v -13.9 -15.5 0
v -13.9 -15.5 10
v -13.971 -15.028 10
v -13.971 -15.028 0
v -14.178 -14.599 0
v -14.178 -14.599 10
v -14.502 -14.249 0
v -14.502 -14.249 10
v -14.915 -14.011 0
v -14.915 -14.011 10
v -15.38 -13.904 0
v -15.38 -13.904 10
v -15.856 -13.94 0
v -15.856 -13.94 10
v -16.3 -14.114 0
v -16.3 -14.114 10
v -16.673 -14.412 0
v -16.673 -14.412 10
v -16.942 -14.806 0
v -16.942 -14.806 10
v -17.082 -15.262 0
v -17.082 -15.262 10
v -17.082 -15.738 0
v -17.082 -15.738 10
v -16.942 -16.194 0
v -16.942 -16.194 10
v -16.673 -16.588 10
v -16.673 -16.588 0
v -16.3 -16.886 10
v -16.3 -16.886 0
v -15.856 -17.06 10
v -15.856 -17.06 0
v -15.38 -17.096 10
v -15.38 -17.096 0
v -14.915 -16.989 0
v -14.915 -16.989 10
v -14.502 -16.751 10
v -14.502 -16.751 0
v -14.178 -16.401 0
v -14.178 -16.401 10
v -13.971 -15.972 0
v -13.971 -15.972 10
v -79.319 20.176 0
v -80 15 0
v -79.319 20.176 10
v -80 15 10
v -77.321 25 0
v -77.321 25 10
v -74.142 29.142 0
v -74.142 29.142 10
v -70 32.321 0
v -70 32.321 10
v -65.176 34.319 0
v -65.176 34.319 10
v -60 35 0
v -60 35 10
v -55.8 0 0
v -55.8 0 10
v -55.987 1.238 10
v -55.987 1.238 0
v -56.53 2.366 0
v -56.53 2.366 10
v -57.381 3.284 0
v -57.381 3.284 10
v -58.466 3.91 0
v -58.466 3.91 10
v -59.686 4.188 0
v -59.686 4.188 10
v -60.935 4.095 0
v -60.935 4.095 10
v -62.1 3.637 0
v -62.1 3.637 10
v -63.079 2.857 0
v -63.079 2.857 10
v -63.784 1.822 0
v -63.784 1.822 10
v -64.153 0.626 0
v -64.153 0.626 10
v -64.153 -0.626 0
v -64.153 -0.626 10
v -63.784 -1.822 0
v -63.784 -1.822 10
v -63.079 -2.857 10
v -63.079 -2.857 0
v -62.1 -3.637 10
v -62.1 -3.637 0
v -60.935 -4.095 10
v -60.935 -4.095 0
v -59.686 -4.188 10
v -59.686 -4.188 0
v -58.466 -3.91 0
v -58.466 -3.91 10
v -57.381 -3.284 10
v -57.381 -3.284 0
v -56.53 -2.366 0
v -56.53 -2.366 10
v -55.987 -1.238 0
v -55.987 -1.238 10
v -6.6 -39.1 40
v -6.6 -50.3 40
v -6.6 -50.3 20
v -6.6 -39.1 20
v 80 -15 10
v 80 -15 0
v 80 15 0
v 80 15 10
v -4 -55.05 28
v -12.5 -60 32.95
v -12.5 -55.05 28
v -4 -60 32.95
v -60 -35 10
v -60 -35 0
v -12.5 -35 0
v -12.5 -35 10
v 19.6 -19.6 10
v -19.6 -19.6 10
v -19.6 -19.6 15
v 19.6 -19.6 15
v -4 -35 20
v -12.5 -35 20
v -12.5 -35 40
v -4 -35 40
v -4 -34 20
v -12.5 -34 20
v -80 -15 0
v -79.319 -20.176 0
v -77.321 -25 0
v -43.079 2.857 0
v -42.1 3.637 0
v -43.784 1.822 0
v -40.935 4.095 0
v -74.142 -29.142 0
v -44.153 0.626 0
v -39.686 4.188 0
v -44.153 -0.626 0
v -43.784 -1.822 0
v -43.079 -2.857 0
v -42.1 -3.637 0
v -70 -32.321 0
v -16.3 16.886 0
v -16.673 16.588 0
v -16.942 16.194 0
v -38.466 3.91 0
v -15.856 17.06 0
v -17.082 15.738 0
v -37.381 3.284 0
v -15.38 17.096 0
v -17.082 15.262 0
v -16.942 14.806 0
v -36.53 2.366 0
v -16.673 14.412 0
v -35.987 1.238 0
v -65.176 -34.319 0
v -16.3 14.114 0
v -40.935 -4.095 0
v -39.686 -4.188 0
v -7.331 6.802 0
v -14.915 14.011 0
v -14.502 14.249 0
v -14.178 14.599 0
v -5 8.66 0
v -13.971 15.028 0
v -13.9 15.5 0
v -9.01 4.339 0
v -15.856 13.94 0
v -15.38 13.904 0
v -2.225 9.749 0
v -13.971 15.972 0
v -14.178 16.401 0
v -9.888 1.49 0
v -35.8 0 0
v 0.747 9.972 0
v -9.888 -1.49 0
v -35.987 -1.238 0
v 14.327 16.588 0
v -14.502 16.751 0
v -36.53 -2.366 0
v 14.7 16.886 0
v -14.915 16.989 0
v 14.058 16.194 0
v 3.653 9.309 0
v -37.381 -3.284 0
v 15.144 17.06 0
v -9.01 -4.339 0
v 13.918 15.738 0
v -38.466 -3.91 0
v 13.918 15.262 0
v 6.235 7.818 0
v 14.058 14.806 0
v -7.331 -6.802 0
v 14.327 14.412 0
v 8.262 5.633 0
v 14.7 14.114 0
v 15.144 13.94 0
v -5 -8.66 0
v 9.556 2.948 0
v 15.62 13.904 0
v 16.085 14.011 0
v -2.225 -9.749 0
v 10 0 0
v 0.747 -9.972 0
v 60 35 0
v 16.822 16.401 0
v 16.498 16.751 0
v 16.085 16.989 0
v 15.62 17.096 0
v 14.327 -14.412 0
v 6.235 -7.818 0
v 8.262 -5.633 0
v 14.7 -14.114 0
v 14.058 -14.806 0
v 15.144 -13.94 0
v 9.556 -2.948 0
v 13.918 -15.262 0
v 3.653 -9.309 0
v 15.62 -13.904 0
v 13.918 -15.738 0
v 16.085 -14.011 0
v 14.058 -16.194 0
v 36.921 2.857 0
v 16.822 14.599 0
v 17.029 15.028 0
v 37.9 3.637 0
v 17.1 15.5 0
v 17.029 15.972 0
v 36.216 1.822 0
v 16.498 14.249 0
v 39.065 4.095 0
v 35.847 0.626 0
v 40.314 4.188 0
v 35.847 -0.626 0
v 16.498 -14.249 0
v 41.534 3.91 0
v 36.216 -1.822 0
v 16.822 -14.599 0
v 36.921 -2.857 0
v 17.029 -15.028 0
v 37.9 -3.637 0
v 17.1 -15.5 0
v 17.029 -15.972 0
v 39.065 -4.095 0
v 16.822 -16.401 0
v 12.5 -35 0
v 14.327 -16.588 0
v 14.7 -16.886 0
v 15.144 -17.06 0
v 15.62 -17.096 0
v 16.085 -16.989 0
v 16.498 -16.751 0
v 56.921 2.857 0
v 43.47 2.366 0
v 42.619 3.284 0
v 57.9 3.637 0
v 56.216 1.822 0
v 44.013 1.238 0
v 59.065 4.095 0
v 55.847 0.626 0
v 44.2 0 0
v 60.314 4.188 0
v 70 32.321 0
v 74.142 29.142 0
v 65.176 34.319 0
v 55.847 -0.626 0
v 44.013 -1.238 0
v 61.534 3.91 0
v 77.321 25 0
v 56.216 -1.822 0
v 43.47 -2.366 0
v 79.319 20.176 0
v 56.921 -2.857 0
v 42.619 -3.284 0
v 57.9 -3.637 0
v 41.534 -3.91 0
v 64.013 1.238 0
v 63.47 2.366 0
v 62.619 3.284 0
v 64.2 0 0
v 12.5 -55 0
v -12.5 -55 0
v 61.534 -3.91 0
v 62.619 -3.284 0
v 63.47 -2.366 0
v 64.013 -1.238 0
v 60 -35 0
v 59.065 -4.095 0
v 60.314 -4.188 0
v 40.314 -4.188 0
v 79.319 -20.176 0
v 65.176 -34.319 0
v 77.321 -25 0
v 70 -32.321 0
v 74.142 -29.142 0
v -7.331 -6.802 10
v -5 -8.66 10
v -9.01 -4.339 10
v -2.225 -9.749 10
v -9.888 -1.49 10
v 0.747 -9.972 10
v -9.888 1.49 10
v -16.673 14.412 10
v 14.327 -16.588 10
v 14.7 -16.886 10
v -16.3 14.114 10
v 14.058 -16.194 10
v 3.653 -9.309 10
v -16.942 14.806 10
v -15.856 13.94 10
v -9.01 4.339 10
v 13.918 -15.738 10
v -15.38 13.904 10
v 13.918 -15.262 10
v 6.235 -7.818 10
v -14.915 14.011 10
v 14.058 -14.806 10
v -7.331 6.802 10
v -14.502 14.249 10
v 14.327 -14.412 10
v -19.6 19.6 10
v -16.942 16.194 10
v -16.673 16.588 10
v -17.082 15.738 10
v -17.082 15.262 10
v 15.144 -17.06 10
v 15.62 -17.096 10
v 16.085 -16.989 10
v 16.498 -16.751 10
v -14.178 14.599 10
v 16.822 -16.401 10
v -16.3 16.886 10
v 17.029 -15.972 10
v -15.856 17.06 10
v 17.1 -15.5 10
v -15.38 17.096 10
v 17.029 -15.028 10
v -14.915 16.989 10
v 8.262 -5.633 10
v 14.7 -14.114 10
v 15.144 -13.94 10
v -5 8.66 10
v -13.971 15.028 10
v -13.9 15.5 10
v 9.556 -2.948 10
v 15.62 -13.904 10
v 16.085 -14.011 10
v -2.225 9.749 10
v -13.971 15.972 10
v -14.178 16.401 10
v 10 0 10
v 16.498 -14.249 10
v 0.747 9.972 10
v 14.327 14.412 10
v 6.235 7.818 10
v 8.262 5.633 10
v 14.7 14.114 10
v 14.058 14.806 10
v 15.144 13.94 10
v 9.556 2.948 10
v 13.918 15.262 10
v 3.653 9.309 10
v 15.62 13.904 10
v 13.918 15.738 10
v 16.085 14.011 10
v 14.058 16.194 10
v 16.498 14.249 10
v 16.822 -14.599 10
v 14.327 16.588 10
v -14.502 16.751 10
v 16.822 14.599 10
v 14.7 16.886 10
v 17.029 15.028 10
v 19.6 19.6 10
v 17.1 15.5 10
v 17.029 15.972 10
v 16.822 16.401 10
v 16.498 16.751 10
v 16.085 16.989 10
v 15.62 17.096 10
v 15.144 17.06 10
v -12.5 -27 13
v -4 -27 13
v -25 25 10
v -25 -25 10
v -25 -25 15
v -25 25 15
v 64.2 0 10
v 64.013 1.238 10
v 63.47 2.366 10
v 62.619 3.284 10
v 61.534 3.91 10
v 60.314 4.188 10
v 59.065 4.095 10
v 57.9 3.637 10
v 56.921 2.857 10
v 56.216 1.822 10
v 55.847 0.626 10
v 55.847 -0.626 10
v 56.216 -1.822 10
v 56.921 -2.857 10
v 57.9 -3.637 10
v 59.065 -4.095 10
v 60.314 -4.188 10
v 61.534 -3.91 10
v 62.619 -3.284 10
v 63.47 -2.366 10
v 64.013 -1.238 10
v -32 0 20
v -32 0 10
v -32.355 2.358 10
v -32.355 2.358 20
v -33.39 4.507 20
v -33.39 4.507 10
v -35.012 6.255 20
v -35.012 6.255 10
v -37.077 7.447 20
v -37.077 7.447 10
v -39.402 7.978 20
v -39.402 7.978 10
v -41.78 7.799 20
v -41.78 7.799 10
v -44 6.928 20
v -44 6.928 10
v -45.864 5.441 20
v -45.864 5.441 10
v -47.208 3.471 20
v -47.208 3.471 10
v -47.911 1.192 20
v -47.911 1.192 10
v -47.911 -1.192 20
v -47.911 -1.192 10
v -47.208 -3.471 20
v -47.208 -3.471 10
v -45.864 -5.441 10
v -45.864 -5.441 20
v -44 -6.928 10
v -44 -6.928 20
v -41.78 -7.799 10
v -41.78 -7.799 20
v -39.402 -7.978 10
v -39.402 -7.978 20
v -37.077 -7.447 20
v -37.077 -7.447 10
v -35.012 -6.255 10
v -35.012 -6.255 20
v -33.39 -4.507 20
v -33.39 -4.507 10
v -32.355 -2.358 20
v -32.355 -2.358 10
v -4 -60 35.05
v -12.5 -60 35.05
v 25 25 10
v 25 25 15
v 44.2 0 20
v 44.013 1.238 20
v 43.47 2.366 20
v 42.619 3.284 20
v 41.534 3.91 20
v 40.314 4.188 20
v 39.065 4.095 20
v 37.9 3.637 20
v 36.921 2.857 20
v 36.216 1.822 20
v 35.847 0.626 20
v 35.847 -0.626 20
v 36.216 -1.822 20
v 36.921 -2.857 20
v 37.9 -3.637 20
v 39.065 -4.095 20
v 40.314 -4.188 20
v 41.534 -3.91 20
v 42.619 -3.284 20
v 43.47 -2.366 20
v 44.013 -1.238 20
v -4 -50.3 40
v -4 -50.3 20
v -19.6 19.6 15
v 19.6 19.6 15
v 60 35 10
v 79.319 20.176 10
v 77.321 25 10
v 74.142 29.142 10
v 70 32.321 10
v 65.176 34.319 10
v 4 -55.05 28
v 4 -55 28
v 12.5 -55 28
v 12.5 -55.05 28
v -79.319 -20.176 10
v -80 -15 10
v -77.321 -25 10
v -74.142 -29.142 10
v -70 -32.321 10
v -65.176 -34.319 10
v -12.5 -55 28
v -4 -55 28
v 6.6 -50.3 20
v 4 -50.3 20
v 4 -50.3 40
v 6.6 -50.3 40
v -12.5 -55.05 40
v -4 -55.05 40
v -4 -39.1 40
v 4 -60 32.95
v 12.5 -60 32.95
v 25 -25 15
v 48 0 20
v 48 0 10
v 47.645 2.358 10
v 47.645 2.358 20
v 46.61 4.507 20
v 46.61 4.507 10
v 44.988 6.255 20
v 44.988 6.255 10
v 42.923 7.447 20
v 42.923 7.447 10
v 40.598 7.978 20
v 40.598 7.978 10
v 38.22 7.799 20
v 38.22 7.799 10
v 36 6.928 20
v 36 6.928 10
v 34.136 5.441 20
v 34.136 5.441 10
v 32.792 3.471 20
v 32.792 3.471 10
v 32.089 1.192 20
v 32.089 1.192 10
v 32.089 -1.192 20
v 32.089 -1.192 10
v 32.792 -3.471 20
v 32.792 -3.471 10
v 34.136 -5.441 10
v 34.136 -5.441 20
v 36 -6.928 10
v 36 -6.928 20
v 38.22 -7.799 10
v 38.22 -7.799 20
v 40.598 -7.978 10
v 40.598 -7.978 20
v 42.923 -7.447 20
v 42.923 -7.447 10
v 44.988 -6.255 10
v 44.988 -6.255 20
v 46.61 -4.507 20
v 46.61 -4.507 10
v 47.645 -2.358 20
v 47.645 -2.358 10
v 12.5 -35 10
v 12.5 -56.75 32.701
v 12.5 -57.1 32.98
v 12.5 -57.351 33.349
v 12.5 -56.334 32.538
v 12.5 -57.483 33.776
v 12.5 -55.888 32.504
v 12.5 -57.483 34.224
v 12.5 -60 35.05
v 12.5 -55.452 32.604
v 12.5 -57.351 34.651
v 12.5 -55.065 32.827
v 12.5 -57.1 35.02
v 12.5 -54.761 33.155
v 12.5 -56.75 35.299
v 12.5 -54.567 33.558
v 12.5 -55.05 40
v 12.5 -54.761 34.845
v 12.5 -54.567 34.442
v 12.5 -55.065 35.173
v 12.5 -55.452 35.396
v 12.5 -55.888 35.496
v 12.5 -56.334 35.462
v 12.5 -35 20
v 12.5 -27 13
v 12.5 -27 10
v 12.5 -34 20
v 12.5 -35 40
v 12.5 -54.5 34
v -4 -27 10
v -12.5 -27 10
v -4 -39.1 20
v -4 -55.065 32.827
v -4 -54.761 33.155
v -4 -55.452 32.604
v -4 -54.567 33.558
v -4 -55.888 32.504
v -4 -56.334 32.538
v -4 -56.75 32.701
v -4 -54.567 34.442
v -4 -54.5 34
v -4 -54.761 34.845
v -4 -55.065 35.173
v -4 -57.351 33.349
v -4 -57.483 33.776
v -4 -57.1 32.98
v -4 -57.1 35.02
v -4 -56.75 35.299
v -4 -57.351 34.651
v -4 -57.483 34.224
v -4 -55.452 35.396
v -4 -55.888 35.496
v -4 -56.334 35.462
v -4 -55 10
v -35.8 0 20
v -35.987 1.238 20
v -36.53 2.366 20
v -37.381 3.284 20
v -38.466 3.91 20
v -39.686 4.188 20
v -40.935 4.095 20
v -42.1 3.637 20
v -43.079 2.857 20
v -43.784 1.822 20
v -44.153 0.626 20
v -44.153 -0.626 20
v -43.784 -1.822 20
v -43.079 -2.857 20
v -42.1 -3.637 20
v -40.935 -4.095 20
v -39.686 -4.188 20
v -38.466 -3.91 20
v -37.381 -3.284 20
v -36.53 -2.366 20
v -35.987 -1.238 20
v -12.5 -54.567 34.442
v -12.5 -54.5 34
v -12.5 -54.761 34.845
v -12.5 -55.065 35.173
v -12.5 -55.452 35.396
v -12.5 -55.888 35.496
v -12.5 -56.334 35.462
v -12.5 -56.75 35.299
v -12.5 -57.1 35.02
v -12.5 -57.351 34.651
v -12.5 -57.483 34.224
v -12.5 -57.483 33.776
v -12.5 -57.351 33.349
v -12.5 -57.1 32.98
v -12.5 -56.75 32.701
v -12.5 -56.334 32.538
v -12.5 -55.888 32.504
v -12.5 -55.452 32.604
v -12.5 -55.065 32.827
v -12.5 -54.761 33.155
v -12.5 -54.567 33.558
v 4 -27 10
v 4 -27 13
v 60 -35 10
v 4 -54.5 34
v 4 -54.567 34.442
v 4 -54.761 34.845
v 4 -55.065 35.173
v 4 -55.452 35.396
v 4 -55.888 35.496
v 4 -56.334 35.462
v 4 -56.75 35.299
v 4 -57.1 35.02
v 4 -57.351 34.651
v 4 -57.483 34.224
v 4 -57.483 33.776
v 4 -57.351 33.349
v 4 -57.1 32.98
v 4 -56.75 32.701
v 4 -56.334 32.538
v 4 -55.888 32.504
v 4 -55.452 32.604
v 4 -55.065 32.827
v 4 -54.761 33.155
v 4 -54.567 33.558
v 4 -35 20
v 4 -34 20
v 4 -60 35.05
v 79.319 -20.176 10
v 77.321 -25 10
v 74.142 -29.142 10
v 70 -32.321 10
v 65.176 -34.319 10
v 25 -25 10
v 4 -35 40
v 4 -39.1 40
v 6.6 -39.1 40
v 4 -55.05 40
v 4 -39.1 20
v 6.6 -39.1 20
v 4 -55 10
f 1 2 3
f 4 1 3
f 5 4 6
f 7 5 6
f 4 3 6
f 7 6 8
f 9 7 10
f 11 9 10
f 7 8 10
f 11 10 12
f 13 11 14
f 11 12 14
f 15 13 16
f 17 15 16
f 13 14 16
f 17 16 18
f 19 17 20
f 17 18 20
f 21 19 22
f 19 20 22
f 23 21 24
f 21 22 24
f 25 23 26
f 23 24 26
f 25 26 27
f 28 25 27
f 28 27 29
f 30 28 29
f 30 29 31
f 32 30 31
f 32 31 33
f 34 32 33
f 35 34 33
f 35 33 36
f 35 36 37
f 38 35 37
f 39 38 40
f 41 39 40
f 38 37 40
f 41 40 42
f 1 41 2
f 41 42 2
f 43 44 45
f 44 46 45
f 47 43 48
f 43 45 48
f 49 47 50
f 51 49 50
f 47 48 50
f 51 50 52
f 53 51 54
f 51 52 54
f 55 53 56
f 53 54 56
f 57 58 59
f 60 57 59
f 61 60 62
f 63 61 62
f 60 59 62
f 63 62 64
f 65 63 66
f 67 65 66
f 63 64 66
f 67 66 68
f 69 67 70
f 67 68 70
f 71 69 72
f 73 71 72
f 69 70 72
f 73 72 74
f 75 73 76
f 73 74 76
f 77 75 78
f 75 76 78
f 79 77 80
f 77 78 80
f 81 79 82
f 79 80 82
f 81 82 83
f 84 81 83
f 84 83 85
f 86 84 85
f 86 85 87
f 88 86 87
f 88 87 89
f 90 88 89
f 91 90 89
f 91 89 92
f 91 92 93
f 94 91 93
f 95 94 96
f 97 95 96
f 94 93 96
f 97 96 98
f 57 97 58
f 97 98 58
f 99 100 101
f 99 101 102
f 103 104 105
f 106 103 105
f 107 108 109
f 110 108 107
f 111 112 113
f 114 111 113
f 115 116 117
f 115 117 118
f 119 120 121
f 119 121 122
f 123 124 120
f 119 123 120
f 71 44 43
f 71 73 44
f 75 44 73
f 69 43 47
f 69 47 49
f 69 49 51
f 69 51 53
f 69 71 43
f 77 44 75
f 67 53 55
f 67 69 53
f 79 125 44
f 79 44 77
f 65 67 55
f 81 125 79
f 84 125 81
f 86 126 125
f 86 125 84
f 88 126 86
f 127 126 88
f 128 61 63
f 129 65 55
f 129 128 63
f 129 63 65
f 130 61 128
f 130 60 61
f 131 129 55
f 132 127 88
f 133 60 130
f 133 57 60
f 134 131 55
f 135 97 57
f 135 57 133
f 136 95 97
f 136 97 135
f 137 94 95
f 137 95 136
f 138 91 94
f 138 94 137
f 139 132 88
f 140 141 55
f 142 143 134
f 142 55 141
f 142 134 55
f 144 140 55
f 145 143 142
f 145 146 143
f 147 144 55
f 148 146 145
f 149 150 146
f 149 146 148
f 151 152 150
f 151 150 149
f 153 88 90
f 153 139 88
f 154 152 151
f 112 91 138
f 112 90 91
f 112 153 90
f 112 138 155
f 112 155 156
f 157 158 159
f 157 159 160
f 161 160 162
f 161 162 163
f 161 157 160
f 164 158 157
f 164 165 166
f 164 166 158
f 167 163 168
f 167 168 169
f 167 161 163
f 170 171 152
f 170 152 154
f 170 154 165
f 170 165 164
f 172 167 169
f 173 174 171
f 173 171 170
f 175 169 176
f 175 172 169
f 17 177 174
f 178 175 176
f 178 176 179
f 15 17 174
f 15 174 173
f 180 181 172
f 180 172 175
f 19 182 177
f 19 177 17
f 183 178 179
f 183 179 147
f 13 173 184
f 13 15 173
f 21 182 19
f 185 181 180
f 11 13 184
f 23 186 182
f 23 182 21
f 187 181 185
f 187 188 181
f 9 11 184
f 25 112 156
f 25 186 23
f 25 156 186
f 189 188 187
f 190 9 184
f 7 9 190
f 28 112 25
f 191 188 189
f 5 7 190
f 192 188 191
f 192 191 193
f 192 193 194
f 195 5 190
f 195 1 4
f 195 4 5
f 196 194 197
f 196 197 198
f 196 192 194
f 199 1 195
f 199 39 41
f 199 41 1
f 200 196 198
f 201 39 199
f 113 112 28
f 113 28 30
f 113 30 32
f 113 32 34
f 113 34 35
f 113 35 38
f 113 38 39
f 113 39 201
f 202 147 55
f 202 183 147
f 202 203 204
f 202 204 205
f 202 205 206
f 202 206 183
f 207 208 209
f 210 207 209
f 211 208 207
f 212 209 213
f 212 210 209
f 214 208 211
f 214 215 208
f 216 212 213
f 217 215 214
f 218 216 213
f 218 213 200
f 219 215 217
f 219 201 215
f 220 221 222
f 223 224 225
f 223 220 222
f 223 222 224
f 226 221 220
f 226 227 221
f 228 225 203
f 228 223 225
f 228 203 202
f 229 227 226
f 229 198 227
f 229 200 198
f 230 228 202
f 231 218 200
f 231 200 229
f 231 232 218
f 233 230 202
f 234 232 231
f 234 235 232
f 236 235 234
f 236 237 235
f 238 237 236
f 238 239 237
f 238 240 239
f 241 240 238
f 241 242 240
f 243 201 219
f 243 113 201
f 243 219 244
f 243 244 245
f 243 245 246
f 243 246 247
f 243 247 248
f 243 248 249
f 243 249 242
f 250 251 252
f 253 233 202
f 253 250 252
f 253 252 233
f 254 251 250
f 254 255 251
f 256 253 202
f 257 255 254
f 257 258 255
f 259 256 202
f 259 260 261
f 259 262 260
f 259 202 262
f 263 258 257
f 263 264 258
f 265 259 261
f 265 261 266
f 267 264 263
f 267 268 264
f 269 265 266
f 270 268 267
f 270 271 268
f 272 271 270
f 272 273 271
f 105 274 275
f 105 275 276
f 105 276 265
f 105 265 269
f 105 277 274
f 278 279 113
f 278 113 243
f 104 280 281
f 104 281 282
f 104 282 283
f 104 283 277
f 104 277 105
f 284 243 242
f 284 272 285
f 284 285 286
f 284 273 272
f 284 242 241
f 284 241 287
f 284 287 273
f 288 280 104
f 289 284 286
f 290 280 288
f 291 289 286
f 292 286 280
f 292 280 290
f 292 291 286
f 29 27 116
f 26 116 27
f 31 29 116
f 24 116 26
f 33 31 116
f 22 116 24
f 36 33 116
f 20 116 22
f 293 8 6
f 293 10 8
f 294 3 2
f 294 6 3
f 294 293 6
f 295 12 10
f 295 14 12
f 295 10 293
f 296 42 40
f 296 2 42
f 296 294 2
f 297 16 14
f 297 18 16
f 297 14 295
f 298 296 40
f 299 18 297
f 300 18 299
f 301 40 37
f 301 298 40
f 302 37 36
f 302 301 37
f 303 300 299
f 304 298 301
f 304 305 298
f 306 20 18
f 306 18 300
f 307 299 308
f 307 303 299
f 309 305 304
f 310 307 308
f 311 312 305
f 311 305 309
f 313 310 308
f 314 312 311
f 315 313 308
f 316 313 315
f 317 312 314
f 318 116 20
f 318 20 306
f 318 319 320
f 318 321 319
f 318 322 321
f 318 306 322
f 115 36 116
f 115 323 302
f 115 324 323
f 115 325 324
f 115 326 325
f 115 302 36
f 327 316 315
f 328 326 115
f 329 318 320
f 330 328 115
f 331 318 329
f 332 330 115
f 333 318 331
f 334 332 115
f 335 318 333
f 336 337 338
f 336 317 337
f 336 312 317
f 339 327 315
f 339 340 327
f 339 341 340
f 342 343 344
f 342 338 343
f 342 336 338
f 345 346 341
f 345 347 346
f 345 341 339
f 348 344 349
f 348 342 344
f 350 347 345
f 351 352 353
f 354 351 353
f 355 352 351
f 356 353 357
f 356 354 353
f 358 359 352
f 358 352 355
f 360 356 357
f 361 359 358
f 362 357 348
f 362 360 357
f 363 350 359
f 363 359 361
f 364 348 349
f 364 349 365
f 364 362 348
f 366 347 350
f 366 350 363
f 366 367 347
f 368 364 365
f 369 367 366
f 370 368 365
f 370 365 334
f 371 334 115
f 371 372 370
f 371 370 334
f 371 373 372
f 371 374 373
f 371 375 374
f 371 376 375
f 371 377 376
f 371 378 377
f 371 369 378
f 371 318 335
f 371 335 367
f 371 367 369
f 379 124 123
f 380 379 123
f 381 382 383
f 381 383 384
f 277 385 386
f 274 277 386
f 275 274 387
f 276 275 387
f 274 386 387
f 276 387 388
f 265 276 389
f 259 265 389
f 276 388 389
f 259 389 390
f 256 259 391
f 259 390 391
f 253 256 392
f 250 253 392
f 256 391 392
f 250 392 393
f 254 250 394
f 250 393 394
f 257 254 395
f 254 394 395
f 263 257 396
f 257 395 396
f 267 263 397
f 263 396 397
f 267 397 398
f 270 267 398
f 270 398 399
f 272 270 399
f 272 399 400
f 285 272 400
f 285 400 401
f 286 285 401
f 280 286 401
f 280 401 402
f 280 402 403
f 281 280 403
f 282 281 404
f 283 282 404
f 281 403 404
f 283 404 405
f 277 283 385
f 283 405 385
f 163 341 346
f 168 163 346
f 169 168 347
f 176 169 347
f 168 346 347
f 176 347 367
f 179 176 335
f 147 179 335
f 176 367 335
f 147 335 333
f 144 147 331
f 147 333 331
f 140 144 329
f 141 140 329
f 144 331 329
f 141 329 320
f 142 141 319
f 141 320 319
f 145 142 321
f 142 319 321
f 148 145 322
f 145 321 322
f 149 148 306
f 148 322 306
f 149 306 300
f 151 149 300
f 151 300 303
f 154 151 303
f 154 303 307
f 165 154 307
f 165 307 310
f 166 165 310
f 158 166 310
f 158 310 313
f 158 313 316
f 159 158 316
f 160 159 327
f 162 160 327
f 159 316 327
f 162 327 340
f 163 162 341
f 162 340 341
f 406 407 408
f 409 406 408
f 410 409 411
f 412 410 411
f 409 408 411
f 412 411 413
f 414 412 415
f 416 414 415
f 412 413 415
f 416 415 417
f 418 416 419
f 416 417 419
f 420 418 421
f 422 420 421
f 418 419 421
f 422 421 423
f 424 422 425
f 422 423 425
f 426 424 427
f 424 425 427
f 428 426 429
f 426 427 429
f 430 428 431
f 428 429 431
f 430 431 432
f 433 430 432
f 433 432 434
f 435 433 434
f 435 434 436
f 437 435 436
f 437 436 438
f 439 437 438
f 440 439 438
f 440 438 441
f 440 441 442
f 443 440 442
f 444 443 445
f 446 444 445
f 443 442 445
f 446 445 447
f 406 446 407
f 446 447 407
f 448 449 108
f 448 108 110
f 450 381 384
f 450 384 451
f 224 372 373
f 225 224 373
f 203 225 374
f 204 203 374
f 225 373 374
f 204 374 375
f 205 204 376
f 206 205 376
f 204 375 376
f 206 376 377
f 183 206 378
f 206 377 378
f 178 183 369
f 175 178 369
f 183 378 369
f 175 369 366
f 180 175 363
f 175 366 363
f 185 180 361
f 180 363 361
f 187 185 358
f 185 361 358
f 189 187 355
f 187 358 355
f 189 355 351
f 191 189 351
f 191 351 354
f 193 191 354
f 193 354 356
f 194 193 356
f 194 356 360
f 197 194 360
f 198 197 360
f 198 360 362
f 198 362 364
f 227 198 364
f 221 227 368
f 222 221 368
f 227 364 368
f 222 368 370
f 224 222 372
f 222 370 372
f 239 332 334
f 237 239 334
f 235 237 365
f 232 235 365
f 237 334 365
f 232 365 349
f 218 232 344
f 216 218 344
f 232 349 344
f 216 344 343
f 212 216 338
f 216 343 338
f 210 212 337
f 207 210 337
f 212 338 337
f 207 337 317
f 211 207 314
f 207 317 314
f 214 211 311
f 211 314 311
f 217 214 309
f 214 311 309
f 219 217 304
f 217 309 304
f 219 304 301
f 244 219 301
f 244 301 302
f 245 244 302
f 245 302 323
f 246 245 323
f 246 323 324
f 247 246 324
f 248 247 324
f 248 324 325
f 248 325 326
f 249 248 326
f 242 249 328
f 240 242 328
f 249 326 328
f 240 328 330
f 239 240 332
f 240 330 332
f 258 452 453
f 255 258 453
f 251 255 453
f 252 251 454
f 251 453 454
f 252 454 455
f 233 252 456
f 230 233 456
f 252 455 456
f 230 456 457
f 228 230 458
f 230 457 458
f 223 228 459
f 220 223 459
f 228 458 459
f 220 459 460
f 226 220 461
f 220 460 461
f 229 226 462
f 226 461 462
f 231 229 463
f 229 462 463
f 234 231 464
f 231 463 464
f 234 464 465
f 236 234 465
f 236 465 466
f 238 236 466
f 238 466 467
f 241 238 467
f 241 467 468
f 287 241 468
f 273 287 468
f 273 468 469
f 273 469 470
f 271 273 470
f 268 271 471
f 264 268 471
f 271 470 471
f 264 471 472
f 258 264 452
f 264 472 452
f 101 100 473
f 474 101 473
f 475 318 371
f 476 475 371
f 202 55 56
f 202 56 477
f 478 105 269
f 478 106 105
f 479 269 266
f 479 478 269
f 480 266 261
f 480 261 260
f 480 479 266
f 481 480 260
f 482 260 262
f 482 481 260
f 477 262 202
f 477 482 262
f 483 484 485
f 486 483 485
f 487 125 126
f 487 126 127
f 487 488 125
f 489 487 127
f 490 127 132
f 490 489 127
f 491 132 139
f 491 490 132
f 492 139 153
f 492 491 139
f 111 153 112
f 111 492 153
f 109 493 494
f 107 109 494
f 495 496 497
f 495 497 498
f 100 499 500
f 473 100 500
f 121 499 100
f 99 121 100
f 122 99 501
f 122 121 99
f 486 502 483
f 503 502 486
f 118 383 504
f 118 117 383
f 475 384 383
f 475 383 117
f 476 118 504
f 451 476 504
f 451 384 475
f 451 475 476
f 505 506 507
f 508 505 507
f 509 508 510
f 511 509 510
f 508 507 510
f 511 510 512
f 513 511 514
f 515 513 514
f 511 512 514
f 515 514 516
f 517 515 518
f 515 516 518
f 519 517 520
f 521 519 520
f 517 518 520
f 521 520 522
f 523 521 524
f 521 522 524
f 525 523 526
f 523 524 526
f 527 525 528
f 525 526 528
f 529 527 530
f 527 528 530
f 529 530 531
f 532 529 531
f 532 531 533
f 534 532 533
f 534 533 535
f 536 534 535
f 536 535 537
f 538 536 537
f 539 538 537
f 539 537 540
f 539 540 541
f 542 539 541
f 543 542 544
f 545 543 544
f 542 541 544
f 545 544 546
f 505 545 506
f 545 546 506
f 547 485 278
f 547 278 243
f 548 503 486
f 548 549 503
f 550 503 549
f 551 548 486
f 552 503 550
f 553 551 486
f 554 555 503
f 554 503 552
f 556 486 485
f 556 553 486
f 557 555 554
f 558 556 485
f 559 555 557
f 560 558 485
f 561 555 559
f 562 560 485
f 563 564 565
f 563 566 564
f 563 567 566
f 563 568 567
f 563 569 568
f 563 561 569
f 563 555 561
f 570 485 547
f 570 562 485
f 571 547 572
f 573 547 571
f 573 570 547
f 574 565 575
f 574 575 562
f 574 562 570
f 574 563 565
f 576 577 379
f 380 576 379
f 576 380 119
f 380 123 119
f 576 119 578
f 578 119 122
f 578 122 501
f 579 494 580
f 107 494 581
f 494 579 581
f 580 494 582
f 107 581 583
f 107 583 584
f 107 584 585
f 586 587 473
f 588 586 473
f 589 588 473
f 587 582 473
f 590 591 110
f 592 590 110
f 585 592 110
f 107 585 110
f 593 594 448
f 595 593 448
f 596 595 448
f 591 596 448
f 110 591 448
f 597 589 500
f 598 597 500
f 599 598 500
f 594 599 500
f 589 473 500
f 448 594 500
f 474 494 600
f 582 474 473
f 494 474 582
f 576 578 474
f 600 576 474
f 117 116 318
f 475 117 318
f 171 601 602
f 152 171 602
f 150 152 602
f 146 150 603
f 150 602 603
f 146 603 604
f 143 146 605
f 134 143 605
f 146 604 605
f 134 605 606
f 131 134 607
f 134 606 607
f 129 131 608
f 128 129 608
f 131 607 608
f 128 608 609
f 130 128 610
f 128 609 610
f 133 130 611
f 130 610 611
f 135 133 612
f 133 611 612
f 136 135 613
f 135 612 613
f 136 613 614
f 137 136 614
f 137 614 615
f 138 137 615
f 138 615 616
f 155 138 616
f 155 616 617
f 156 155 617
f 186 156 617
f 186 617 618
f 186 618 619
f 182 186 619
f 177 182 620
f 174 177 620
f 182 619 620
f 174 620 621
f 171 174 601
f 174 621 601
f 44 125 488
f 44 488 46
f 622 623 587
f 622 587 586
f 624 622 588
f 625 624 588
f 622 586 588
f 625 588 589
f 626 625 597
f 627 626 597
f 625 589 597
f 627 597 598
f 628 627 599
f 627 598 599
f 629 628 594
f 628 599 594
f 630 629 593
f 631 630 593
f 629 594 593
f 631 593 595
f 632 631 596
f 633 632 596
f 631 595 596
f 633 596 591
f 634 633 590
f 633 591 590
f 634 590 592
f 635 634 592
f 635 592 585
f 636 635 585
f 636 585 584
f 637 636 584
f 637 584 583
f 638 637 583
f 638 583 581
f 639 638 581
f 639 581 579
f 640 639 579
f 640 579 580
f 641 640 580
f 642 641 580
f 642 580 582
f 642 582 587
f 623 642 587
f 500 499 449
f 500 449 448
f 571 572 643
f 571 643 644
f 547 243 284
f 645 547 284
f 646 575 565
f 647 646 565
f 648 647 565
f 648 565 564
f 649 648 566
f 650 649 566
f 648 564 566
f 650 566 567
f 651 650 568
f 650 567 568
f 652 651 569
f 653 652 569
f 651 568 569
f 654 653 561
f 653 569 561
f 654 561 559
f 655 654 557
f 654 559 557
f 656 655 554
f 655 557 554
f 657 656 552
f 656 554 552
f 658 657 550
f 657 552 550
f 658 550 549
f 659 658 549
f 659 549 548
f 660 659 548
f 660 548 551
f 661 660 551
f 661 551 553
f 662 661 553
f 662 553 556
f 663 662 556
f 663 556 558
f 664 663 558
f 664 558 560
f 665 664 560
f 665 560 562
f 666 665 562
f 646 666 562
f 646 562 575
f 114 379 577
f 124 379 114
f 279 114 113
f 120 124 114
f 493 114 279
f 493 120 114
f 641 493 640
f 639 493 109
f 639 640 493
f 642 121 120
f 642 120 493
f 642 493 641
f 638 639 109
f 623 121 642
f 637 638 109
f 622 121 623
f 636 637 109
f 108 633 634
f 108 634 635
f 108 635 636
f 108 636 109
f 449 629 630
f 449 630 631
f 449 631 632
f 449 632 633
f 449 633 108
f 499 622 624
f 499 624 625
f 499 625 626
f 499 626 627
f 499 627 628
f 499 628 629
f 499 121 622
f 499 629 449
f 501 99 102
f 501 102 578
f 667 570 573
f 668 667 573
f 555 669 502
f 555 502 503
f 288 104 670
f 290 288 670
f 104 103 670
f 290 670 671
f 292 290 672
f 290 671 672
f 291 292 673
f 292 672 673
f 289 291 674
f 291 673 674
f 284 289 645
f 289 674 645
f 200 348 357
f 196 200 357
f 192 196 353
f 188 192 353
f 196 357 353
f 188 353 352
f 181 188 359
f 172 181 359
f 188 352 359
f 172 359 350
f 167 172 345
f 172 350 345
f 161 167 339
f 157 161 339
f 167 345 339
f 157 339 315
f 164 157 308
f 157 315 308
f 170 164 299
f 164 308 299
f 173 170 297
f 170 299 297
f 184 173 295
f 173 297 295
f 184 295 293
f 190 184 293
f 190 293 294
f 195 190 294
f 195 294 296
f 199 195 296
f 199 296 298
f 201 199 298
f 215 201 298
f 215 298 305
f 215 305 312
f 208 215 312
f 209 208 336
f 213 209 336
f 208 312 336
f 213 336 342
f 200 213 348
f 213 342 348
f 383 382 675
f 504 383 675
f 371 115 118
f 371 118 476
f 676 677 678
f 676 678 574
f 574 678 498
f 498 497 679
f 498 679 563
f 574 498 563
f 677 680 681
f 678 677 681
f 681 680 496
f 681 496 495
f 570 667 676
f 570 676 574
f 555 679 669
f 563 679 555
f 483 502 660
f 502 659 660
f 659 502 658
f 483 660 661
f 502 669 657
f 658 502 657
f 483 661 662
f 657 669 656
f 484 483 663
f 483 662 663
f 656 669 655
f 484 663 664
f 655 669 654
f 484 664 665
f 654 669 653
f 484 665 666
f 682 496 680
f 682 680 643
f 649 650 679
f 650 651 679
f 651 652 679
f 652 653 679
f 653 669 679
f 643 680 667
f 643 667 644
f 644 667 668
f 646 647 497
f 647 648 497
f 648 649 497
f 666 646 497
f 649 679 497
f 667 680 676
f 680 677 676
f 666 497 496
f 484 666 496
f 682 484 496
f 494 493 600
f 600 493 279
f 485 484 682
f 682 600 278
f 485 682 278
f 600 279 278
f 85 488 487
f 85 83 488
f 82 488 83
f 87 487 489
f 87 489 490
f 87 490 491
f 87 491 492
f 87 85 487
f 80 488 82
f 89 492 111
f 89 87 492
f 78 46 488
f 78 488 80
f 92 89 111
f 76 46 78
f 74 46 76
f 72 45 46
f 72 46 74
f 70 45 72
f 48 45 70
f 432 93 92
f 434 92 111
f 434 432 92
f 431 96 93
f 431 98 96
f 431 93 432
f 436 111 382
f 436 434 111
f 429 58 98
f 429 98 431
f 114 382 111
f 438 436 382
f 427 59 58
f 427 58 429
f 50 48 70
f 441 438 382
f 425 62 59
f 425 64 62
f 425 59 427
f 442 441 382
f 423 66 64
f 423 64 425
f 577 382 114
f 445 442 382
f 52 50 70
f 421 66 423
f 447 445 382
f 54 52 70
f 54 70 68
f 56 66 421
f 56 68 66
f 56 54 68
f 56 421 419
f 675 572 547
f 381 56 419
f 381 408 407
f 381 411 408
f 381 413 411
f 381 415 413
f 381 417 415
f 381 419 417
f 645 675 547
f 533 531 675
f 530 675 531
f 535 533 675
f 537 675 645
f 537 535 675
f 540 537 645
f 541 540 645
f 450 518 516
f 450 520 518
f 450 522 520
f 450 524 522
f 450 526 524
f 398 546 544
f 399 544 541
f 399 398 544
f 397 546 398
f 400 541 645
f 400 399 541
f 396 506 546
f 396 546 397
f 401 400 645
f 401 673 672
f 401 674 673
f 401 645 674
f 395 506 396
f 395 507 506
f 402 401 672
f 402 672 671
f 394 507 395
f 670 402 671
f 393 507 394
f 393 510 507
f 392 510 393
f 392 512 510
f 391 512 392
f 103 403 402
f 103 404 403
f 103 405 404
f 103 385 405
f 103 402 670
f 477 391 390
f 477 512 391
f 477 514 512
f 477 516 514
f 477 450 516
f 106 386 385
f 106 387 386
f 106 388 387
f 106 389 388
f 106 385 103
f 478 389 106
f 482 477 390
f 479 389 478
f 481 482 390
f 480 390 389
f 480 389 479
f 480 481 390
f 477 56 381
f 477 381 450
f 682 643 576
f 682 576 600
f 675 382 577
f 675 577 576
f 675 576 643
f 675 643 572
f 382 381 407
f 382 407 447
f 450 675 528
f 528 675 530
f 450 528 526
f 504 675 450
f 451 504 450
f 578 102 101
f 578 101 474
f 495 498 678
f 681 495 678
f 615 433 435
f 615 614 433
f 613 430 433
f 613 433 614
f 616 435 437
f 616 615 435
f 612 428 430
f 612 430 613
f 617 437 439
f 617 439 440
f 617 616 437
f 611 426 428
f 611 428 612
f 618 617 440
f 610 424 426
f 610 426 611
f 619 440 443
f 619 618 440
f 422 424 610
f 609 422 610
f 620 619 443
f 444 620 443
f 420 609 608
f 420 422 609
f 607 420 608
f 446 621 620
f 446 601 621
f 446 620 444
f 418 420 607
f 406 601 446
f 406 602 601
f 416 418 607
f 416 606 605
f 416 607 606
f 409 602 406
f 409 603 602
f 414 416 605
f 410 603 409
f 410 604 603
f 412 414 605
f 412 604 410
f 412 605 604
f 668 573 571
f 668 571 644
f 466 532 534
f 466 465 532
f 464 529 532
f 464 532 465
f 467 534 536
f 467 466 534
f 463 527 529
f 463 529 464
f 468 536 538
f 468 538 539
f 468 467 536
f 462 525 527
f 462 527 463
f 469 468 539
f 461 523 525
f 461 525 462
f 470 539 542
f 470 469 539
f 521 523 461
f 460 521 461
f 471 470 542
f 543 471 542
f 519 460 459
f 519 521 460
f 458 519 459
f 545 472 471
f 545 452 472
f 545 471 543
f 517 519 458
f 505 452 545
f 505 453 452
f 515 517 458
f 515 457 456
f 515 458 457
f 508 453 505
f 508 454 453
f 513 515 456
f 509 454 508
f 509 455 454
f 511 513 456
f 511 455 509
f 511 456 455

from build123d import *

# Parameters (mm, degrees)
SKETCH_W        = 160
SKETCH_H        = 70
PAD_DEPTH       = 10
SKETCH001_R     = 10
POCKET_DEPTH    = 10
SKETCH002_R     = 8
PAD001_DEPTH    = 10
SKETCH003_R     = 4.2
POCKET001_DEPTH = 20
SKETCH004_W     = 50
SKETCH004_H     = 50
SKETCH004_W_2   = 39.2
SKETCH004_H_2   = 39.2
PAD002_DEPTH    = 5
SKETCH005_R     = 1.6
POCKET002_DEPTH = 10
SKETCH006_R     = 4.2
POCKET003_DEPTH = 10
SKETCH007_W     = 25
SKETCH007_H     = 20
PAD003_DEPTH    = 40
SKETCH008_W     = 8
SKETCH008_H     = 20
POCKET004_DEPTH = 30
SKETCH009_W     = 13.2
SKETCH009_H     = 11.2
POCKET005_DEPTH = 20
SKETCH010_W     = 8.5
SKETCH010_H     = 12
PAD004_DEPTH    = 5
SKETCH011_R     = 1.5
POCKET006_DEPTH = 25
CHAMFER_SIZE    = 4.95
CHAMFER001_SIZE = 4.95
CHAMFER002_SIZE = 4.95
CHAMFER003_SIZE = 4.95
FILLET_R        = 20
FILLET001_R     = 20
FILLET002_R     = 20
FILLET003_R     = 20
SKETCH012_W     = 8
SKETCH012_H     = 10
PAD005_DEPTH    = 8.5
SKETCH013_W     = 8
SKETCH013_H     = 10
PAD006_DEPTH    = 8.5
CHAMFER004_SIZE = 7
CHAMFER005_SIZE = 7


with BuildPart() as part:
    # Sketch → Pad (new body)
    with BuildSketch(Plane.XY):
        Rectangle(SKETCH_W, SKETCH_H)
    extrude(amount=PAD_DEPTH)

    # Sketch001 (on Face6 of Pad) → Pocket (cut)
    with BuildSketch(Plane.XY.offset(10)):
        Circle(SKETCH001_R)
    extrude(amount=-POCKET_DEPTH, mode=Mode.SUBTRACT)

    # Sketch002 (on Face5 of Pocket) → Pad001 (join)
    with BuildSketch(Plane.XY.offset(10)):
        with Locations((-40, 0)):
            Circle(SKETCH002_R)
        with Locations((40, 0)):
            Circle(SKETCH002_R)
    extrude(amount=PAD001_DEPTH)

    # Sketch003 (on Face10 of Pad001) → Pocket001 (cut)
    with BuildSketch(Plane.XY.offset(20)):
        with Locations((-40, 0)):
            Circle(SKETCH003_R)
        with Locations((40, 0)):
            Circle(SKETCH003_R)
    extrude(amount=-POCKET001_DEPTH, mode=Mode.SUBTRACT)

    # Sketch004 (on Face5 of Pocket001) → Pad002 (join)
    with BuildSketch(Plane.XY.offset(10)):
        Rectangle(SKETCH004_W, SKETCH004_H)
        Rectangle(SKETCH004_W_2, SKETCH004_H_2, mode=Mode.SUBTRACT)
    extrude(amount=PAD002_DEPTH)

    # Sketch005 (on Face17 of Pad002) → Pocket002 (cut)
    with BuildSketch(Plane.XY.offset(10)):
        with Locations((-15.5, 15.5)):
            Circle(SKETCH005_R)
        with Locations((15.5, 15.5)):
            Circle(SKETCH005_R)
        with Locations((-15.5, -15.5)):
            Circle(SKETCH005_R)
        with Locations((15.5, -15.5)):
            Circle(SKETCH005_R)
    extrude(amount=-POCKET002_DEPTH, mode=Mode.SUBTRACT)

    # Sketch006 (on Face5 of Pocket002) → Pocket003 (cut)
    with BuildSketch(Plane.XY.offset(10)):
        with Locations((-60, 0)):
            Circle(SKETCH006_R)
        with Locations((60, 0)):
            Circle(SKETCH006_R)
    extrude(amount=-POCKET003_DEPTH, mode=Mode.SUBTRACT)

    # Sketch007 (on Face4 of Pocket003) → Pad003 (join)
    with BuildSketch(Plane(origin=(0, 0, 0), x_dir=(1, 0, 0), z_dir=(0, 0, -1))):
        with Locations((0, 45)):
            Rectangle(SKETCH007_W, SKETCH007_H)
    extrude(amount=-PAD003_DEPTH)

    # Sketch008 (on Face31 of Pad003) → Pocket004 (cut)
    with BuildSketch(Plane.XY.offset(40)):
        with Locations((0, -45)):
            Rectangle(SKETCH008_W, SKETCH008_H)
    extrude(amount=-POCKET004_DEPTH, mode=Mode.SUBTRACT)

    # Sketch009 (on Face33 of Pocket004) → Pocket005 (cut)
    with BuildSketch(Plane.XY.offset(40)):
        with Locations((0, -44.7)):
            Rectangle(SKETCH009_W, SKETCH009_H)
    extrude(amount=-POCKET005_DEPTH, mode=Mode.SUBTRACT)

    # Sketch010 (on Face29 of Pocket005) → Pad004 (join)
    with BuildSketch(Plane.XZ.offset(55)):
        with Locations((-8.25, 34)):
            Rectangle(SKETCH010_W, SKETCH010_H)
        with Locations((8.25, 34)):
            Rectangle(SKETCH010_W, SKETCH010_H)
    extrude(amount=PAD004_DEPTH)

    # Sketch011 (on Face28 of Pad004) → Pocket006 (cut)
    with BuildSketch(Plane.YZ.offset(12.5)):
        with Locations((-56, 34)):
            Circle(SKETCH011_R)
    extrude(amount=-POCKET006_DEPTH, mode=Mode.SUBTRACT)

    # Chamfer
    chamfer_edges = [part.edges().sort_by_distance(p)[0] for p in [
        (8.25, -60, 28),
    ]]
    chamfer(chamfer_edges, length=CHAMFER_SIZE)

    # Chamfer001
    chamfer001_edges = [part.edges().sort_by_distance(p)[0] for p in [
        (-8.25, -60, 28),
    ]]
    chamfer(chamfer001_edges, length=CHAMFER001_SIZE)

    # Chamfer002
    chamfer002_edges = [part.edges().sort_by_distance(p)[0] for p in [
        (8.25, -60, 40),
    ]]
    chamfer(chamfer002_edges, length=CHAMFER002_SIZE)

    # Chamfer003
    chamfer003_edges = [part.edges().sort_by_distance(p)[0] for p in [
        (-8.25, -60, 40),
    ]]
    chamfer(chamfer003_edges, length=CHAMFER003_SIZE)

    # Fillet
    fillet_edges = [part.edges().sort_by_distance(p)[0] for p in [
        (-80, -35, 5),
    ]]
    fillet(fillet_edges, radius=FILLET_R)

    # Fillet001
    fillet001_edges = [part.edges().sort_by_distance(p)[0] for p in [
        (-80, 35, 5),
    ]]
    fillet(fillet001_edges, radius=FILLET001_R)

    # Fillet002
    fillet002_edges = [part.edges().sort_by_distance(p)[0] for p in [
        (80, -35, 5),
    ]]
    fillet(fillet002_edges, radius=FILLET002_R)

    # Fillet003
    fillet003_edges = [part.edges().sort_by_distance(p)[0] for p in [
        (80, 35, 5),
    ]]
    fillet(fillet003_edges, radius=FILLET003_R)

    # Sketch012 (on Face22 of Fillet003) → Pad005 (join)
    with BuildSketch(Plane.YZ.offset(12.5)):
        with Locations((-31, 15)):
            Rectangle(SKETCH012_W, SKETCH012_H)
    extrude(amount=-PAD005_DEPTH)

    # Sketch013 (on Face24 of Pad005) → Pad006 (join)
    with BuildSketch(Plane(origin=(-12.5, 0, 0), x_dir=(0, -1, 0), z_dir=(-1, 0, 0))):
        with Locations((31, 15)):
            Rectangle(SKETCH013_W, SKETCH013_H)
    extrude(amount=-PAD006_DEPTH)

    # Chamfer004
    chamfer004_edges = [part.edges().sort_by_distance(p)[0] for p in [
        (8.25, -27, 20),
    ]]
    chamfer(chamfer004_edges, length=CHAMFER004_SIZE)

    # Chamfer005
    chamfer005_edges = [part.edges().sort_by_distance(p)[0] for p in [
        (-8.25, -27, 20),
    ]]
    chamfer(chamfer005_edges, length=CHAMFER005_SIZE)


solid = part.part
